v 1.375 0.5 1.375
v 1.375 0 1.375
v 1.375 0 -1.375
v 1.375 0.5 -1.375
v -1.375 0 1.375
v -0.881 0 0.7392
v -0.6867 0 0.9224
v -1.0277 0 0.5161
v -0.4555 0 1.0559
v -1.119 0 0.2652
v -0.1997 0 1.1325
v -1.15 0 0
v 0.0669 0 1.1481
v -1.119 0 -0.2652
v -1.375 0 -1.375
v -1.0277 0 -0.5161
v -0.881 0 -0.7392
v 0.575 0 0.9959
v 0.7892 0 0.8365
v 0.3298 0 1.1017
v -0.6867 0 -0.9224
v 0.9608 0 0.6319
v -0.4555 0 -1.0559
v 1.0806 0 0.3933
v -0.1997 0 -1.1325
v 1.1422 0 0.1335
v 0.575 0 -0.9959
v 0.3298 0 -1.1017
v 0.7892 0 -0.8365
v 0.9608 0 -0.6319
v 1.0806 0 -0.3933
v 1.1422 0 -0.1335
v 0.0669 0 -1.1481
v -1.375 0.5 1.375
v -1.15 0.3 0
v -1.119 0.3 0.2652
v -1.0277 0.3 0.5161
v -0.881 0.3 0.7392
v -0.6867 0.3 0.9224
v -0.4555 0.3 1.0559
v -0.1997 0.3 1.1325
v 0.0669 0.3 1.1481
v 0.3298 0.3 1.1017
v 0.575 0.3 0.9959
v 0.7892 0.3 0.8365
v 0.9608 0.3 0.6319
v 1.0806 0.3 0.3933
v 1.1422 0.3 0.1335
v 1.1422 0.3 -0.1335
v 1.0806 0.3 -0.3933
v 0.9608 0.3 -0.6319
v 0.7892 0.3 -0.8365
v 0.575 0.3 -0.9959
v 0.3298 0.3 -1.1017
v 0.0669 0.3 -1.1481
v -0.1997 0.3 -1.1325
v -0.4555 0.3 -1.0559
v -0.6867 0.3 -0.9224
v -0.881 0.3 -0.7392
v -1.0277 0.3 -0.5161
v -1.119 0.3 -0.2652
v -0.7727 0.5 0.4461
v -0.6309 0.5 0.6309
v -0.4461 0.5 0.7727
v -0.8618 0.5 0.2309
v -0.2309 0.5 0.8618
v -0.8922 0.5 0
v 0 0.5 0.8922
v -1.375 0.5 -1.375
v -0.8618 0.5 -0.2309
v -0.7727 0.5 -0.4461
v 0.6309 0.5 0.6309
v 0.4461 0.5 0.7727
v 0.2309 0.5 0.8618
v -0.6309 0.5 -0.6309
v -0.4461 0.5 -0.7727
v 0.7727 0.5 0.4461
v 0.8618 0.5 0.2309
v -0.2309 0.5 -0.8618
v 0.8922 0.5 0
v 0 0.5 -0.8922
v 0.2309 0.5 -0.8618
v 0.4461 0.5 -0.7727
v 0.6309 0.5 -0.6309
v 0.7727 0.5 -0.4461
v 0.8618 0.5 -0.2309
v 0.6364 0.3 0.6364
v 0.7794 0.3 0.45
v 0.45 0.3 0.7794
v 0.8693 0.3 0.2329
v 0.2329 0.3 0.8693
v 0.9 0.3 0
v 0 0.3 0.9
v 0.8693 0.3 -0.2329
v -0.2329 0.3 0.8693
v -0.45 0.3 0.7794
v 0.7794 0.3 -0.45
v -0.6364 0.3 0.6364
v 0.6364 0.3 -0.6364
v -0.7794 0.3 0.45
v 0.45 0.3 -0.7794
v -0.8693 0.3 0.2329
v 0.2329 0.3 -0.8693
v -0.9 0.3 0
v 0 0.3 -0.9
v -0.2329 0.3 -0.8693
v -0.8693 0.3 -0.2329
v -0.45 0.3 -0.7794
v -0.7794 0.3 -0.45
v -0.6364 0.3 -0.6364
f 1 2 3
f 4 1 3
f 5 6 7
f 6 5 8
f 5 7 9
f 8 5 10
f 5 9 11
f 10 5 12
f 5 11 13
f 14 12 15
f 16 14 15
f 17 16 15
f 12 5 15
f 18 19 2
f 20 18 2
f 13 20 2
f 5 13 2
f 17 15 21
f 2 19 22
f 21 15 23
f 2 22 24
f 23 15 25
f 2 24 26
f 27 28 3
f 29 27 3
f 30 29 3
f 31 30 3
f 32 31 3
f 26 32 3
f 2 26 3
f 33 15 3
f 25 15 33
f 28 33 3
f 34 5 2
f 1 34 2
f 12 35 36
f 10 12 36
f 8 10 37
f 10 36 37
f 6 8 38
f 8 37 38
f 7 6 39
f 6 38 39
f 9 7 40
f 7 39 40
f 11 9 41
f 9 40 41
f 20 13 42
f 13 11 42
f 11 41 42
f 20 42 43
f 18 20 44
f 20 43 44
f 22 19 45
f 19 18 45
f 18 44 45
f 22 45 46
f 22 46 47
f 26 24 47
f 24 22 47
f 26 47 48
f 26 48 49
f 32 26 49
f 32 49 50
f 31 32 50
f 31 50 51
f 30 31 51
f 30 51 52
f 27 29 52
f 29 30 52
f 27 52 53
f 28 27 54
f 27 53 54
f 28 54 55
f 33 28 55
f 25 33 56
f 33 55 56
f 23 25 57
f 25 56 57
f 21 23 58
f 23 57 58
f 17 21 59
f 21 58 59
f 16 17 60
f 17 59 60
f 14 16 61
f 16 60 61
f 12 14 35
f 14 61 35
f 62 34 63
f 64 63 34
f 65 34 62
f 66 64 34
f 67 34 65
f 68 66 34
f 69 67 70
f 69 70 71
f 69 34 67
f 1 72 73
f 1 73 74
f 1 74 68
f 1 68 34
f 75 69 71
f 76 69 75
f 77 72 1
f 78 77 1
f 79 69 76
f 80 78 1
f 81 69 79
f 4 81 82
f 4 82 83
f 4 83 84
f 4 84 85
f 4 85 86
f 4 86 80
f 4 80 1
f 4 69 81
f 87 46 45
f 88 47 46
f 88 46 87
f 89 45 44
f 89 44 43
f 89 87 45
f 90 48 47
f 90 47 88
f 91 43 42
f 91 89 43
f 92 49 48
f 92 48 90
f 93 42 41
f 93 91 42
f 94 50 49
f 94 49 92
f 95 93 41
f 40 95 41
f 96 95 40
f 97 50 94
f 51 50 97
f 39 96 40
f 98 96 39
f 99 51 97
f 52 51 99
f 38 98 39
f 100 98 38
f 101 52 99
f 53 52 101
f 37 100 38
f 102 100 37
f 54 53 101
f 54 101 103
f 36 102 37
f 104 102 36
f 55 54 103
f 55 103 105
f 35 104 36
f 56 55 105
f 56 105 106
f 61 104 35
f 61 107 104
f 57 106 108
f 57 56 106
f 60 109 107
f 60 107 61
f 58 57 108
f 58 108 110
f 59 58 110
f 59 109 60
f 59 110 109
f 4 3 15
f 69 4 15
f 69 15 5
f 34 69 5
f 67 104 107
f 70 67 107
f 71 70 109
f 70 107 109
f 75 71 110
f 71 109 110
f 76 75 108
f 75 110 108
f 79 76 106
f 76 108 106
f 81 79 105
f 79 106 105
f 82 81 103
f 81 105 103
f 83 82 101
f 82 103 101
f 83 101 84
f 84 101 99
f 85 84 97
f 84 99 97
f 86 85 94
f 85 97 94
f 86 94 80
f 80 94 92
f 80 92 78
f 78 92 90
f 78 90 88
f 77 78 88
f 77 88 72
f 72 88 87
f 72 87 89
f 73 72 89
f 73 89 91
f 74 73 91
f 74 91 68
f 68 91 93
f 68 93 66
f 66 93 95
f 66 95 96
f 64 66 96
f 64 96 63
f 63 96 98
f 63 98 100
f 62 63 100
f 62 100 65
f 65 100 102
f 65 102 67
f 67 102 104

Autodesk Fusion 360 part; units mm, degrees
sketch "Sketch1" plane through (0, 0, 0) normal (0, 1, 0) x (1, 0, 0)
  line L0 (-1.375, -1.375) -> (1.375, -1.375)
  line L1 (1.375, -1.375) -> (1.375, 1.375)
  line L2 (1.375, 1.375) -> (-1.375, 1.375)
  line L3 (-1.375, 1.375) -> (-1.375, -1.375)
  line L4 (-1.375, -1.375) -> (1.375, 1.375) construction
  line L5 (1.375, -1.375) -> (-1.375, 1.375) construction
  dimension "d1" = 2.75
  dimension "d2" = 2.75
extrude "Extrude1" add sketch "Sketch1" along normal blind 0.5
ref_plane "WorkPlane1" through (0, 0.25, 0) normal (0, 0, 1) x (1, 0, 0)
sketch "Sketch2" plane through (0, 0.25, 0) normal (0, 0, 1) x (1, 0, 0)
  line L0 (-1.375, -0.25) -> (1.375, -0.25)
  line L1 (0, -0.25) -> (-1.15, -0.25)
  line L2 (-1.375, 0.25) -> (1.375, 0.25)
  line L3 (0, 0.25) -> (0, -0.25)
  line L4 (-1.15, -0.25) -> (-1.15, 0.05)
  line L5 (-1.15, 0.05) -> (-0.9, 0.05)
  line L6 (-0.9, 0.05) -> (-0.8922, 0.25)
  dimension "d5" = 1.15
  dimension "d6" = 0.3
  dimension "d7" = 0.25
sketch "Sketch3" plane through (0, 0, 0) normal (0, 0, 1) x (1, 0, 0)
revolve "Revolve1" cut sketch "Sketch2" angle 360 about axis through (0, 0.5, 0) along (0, -1, 0)
